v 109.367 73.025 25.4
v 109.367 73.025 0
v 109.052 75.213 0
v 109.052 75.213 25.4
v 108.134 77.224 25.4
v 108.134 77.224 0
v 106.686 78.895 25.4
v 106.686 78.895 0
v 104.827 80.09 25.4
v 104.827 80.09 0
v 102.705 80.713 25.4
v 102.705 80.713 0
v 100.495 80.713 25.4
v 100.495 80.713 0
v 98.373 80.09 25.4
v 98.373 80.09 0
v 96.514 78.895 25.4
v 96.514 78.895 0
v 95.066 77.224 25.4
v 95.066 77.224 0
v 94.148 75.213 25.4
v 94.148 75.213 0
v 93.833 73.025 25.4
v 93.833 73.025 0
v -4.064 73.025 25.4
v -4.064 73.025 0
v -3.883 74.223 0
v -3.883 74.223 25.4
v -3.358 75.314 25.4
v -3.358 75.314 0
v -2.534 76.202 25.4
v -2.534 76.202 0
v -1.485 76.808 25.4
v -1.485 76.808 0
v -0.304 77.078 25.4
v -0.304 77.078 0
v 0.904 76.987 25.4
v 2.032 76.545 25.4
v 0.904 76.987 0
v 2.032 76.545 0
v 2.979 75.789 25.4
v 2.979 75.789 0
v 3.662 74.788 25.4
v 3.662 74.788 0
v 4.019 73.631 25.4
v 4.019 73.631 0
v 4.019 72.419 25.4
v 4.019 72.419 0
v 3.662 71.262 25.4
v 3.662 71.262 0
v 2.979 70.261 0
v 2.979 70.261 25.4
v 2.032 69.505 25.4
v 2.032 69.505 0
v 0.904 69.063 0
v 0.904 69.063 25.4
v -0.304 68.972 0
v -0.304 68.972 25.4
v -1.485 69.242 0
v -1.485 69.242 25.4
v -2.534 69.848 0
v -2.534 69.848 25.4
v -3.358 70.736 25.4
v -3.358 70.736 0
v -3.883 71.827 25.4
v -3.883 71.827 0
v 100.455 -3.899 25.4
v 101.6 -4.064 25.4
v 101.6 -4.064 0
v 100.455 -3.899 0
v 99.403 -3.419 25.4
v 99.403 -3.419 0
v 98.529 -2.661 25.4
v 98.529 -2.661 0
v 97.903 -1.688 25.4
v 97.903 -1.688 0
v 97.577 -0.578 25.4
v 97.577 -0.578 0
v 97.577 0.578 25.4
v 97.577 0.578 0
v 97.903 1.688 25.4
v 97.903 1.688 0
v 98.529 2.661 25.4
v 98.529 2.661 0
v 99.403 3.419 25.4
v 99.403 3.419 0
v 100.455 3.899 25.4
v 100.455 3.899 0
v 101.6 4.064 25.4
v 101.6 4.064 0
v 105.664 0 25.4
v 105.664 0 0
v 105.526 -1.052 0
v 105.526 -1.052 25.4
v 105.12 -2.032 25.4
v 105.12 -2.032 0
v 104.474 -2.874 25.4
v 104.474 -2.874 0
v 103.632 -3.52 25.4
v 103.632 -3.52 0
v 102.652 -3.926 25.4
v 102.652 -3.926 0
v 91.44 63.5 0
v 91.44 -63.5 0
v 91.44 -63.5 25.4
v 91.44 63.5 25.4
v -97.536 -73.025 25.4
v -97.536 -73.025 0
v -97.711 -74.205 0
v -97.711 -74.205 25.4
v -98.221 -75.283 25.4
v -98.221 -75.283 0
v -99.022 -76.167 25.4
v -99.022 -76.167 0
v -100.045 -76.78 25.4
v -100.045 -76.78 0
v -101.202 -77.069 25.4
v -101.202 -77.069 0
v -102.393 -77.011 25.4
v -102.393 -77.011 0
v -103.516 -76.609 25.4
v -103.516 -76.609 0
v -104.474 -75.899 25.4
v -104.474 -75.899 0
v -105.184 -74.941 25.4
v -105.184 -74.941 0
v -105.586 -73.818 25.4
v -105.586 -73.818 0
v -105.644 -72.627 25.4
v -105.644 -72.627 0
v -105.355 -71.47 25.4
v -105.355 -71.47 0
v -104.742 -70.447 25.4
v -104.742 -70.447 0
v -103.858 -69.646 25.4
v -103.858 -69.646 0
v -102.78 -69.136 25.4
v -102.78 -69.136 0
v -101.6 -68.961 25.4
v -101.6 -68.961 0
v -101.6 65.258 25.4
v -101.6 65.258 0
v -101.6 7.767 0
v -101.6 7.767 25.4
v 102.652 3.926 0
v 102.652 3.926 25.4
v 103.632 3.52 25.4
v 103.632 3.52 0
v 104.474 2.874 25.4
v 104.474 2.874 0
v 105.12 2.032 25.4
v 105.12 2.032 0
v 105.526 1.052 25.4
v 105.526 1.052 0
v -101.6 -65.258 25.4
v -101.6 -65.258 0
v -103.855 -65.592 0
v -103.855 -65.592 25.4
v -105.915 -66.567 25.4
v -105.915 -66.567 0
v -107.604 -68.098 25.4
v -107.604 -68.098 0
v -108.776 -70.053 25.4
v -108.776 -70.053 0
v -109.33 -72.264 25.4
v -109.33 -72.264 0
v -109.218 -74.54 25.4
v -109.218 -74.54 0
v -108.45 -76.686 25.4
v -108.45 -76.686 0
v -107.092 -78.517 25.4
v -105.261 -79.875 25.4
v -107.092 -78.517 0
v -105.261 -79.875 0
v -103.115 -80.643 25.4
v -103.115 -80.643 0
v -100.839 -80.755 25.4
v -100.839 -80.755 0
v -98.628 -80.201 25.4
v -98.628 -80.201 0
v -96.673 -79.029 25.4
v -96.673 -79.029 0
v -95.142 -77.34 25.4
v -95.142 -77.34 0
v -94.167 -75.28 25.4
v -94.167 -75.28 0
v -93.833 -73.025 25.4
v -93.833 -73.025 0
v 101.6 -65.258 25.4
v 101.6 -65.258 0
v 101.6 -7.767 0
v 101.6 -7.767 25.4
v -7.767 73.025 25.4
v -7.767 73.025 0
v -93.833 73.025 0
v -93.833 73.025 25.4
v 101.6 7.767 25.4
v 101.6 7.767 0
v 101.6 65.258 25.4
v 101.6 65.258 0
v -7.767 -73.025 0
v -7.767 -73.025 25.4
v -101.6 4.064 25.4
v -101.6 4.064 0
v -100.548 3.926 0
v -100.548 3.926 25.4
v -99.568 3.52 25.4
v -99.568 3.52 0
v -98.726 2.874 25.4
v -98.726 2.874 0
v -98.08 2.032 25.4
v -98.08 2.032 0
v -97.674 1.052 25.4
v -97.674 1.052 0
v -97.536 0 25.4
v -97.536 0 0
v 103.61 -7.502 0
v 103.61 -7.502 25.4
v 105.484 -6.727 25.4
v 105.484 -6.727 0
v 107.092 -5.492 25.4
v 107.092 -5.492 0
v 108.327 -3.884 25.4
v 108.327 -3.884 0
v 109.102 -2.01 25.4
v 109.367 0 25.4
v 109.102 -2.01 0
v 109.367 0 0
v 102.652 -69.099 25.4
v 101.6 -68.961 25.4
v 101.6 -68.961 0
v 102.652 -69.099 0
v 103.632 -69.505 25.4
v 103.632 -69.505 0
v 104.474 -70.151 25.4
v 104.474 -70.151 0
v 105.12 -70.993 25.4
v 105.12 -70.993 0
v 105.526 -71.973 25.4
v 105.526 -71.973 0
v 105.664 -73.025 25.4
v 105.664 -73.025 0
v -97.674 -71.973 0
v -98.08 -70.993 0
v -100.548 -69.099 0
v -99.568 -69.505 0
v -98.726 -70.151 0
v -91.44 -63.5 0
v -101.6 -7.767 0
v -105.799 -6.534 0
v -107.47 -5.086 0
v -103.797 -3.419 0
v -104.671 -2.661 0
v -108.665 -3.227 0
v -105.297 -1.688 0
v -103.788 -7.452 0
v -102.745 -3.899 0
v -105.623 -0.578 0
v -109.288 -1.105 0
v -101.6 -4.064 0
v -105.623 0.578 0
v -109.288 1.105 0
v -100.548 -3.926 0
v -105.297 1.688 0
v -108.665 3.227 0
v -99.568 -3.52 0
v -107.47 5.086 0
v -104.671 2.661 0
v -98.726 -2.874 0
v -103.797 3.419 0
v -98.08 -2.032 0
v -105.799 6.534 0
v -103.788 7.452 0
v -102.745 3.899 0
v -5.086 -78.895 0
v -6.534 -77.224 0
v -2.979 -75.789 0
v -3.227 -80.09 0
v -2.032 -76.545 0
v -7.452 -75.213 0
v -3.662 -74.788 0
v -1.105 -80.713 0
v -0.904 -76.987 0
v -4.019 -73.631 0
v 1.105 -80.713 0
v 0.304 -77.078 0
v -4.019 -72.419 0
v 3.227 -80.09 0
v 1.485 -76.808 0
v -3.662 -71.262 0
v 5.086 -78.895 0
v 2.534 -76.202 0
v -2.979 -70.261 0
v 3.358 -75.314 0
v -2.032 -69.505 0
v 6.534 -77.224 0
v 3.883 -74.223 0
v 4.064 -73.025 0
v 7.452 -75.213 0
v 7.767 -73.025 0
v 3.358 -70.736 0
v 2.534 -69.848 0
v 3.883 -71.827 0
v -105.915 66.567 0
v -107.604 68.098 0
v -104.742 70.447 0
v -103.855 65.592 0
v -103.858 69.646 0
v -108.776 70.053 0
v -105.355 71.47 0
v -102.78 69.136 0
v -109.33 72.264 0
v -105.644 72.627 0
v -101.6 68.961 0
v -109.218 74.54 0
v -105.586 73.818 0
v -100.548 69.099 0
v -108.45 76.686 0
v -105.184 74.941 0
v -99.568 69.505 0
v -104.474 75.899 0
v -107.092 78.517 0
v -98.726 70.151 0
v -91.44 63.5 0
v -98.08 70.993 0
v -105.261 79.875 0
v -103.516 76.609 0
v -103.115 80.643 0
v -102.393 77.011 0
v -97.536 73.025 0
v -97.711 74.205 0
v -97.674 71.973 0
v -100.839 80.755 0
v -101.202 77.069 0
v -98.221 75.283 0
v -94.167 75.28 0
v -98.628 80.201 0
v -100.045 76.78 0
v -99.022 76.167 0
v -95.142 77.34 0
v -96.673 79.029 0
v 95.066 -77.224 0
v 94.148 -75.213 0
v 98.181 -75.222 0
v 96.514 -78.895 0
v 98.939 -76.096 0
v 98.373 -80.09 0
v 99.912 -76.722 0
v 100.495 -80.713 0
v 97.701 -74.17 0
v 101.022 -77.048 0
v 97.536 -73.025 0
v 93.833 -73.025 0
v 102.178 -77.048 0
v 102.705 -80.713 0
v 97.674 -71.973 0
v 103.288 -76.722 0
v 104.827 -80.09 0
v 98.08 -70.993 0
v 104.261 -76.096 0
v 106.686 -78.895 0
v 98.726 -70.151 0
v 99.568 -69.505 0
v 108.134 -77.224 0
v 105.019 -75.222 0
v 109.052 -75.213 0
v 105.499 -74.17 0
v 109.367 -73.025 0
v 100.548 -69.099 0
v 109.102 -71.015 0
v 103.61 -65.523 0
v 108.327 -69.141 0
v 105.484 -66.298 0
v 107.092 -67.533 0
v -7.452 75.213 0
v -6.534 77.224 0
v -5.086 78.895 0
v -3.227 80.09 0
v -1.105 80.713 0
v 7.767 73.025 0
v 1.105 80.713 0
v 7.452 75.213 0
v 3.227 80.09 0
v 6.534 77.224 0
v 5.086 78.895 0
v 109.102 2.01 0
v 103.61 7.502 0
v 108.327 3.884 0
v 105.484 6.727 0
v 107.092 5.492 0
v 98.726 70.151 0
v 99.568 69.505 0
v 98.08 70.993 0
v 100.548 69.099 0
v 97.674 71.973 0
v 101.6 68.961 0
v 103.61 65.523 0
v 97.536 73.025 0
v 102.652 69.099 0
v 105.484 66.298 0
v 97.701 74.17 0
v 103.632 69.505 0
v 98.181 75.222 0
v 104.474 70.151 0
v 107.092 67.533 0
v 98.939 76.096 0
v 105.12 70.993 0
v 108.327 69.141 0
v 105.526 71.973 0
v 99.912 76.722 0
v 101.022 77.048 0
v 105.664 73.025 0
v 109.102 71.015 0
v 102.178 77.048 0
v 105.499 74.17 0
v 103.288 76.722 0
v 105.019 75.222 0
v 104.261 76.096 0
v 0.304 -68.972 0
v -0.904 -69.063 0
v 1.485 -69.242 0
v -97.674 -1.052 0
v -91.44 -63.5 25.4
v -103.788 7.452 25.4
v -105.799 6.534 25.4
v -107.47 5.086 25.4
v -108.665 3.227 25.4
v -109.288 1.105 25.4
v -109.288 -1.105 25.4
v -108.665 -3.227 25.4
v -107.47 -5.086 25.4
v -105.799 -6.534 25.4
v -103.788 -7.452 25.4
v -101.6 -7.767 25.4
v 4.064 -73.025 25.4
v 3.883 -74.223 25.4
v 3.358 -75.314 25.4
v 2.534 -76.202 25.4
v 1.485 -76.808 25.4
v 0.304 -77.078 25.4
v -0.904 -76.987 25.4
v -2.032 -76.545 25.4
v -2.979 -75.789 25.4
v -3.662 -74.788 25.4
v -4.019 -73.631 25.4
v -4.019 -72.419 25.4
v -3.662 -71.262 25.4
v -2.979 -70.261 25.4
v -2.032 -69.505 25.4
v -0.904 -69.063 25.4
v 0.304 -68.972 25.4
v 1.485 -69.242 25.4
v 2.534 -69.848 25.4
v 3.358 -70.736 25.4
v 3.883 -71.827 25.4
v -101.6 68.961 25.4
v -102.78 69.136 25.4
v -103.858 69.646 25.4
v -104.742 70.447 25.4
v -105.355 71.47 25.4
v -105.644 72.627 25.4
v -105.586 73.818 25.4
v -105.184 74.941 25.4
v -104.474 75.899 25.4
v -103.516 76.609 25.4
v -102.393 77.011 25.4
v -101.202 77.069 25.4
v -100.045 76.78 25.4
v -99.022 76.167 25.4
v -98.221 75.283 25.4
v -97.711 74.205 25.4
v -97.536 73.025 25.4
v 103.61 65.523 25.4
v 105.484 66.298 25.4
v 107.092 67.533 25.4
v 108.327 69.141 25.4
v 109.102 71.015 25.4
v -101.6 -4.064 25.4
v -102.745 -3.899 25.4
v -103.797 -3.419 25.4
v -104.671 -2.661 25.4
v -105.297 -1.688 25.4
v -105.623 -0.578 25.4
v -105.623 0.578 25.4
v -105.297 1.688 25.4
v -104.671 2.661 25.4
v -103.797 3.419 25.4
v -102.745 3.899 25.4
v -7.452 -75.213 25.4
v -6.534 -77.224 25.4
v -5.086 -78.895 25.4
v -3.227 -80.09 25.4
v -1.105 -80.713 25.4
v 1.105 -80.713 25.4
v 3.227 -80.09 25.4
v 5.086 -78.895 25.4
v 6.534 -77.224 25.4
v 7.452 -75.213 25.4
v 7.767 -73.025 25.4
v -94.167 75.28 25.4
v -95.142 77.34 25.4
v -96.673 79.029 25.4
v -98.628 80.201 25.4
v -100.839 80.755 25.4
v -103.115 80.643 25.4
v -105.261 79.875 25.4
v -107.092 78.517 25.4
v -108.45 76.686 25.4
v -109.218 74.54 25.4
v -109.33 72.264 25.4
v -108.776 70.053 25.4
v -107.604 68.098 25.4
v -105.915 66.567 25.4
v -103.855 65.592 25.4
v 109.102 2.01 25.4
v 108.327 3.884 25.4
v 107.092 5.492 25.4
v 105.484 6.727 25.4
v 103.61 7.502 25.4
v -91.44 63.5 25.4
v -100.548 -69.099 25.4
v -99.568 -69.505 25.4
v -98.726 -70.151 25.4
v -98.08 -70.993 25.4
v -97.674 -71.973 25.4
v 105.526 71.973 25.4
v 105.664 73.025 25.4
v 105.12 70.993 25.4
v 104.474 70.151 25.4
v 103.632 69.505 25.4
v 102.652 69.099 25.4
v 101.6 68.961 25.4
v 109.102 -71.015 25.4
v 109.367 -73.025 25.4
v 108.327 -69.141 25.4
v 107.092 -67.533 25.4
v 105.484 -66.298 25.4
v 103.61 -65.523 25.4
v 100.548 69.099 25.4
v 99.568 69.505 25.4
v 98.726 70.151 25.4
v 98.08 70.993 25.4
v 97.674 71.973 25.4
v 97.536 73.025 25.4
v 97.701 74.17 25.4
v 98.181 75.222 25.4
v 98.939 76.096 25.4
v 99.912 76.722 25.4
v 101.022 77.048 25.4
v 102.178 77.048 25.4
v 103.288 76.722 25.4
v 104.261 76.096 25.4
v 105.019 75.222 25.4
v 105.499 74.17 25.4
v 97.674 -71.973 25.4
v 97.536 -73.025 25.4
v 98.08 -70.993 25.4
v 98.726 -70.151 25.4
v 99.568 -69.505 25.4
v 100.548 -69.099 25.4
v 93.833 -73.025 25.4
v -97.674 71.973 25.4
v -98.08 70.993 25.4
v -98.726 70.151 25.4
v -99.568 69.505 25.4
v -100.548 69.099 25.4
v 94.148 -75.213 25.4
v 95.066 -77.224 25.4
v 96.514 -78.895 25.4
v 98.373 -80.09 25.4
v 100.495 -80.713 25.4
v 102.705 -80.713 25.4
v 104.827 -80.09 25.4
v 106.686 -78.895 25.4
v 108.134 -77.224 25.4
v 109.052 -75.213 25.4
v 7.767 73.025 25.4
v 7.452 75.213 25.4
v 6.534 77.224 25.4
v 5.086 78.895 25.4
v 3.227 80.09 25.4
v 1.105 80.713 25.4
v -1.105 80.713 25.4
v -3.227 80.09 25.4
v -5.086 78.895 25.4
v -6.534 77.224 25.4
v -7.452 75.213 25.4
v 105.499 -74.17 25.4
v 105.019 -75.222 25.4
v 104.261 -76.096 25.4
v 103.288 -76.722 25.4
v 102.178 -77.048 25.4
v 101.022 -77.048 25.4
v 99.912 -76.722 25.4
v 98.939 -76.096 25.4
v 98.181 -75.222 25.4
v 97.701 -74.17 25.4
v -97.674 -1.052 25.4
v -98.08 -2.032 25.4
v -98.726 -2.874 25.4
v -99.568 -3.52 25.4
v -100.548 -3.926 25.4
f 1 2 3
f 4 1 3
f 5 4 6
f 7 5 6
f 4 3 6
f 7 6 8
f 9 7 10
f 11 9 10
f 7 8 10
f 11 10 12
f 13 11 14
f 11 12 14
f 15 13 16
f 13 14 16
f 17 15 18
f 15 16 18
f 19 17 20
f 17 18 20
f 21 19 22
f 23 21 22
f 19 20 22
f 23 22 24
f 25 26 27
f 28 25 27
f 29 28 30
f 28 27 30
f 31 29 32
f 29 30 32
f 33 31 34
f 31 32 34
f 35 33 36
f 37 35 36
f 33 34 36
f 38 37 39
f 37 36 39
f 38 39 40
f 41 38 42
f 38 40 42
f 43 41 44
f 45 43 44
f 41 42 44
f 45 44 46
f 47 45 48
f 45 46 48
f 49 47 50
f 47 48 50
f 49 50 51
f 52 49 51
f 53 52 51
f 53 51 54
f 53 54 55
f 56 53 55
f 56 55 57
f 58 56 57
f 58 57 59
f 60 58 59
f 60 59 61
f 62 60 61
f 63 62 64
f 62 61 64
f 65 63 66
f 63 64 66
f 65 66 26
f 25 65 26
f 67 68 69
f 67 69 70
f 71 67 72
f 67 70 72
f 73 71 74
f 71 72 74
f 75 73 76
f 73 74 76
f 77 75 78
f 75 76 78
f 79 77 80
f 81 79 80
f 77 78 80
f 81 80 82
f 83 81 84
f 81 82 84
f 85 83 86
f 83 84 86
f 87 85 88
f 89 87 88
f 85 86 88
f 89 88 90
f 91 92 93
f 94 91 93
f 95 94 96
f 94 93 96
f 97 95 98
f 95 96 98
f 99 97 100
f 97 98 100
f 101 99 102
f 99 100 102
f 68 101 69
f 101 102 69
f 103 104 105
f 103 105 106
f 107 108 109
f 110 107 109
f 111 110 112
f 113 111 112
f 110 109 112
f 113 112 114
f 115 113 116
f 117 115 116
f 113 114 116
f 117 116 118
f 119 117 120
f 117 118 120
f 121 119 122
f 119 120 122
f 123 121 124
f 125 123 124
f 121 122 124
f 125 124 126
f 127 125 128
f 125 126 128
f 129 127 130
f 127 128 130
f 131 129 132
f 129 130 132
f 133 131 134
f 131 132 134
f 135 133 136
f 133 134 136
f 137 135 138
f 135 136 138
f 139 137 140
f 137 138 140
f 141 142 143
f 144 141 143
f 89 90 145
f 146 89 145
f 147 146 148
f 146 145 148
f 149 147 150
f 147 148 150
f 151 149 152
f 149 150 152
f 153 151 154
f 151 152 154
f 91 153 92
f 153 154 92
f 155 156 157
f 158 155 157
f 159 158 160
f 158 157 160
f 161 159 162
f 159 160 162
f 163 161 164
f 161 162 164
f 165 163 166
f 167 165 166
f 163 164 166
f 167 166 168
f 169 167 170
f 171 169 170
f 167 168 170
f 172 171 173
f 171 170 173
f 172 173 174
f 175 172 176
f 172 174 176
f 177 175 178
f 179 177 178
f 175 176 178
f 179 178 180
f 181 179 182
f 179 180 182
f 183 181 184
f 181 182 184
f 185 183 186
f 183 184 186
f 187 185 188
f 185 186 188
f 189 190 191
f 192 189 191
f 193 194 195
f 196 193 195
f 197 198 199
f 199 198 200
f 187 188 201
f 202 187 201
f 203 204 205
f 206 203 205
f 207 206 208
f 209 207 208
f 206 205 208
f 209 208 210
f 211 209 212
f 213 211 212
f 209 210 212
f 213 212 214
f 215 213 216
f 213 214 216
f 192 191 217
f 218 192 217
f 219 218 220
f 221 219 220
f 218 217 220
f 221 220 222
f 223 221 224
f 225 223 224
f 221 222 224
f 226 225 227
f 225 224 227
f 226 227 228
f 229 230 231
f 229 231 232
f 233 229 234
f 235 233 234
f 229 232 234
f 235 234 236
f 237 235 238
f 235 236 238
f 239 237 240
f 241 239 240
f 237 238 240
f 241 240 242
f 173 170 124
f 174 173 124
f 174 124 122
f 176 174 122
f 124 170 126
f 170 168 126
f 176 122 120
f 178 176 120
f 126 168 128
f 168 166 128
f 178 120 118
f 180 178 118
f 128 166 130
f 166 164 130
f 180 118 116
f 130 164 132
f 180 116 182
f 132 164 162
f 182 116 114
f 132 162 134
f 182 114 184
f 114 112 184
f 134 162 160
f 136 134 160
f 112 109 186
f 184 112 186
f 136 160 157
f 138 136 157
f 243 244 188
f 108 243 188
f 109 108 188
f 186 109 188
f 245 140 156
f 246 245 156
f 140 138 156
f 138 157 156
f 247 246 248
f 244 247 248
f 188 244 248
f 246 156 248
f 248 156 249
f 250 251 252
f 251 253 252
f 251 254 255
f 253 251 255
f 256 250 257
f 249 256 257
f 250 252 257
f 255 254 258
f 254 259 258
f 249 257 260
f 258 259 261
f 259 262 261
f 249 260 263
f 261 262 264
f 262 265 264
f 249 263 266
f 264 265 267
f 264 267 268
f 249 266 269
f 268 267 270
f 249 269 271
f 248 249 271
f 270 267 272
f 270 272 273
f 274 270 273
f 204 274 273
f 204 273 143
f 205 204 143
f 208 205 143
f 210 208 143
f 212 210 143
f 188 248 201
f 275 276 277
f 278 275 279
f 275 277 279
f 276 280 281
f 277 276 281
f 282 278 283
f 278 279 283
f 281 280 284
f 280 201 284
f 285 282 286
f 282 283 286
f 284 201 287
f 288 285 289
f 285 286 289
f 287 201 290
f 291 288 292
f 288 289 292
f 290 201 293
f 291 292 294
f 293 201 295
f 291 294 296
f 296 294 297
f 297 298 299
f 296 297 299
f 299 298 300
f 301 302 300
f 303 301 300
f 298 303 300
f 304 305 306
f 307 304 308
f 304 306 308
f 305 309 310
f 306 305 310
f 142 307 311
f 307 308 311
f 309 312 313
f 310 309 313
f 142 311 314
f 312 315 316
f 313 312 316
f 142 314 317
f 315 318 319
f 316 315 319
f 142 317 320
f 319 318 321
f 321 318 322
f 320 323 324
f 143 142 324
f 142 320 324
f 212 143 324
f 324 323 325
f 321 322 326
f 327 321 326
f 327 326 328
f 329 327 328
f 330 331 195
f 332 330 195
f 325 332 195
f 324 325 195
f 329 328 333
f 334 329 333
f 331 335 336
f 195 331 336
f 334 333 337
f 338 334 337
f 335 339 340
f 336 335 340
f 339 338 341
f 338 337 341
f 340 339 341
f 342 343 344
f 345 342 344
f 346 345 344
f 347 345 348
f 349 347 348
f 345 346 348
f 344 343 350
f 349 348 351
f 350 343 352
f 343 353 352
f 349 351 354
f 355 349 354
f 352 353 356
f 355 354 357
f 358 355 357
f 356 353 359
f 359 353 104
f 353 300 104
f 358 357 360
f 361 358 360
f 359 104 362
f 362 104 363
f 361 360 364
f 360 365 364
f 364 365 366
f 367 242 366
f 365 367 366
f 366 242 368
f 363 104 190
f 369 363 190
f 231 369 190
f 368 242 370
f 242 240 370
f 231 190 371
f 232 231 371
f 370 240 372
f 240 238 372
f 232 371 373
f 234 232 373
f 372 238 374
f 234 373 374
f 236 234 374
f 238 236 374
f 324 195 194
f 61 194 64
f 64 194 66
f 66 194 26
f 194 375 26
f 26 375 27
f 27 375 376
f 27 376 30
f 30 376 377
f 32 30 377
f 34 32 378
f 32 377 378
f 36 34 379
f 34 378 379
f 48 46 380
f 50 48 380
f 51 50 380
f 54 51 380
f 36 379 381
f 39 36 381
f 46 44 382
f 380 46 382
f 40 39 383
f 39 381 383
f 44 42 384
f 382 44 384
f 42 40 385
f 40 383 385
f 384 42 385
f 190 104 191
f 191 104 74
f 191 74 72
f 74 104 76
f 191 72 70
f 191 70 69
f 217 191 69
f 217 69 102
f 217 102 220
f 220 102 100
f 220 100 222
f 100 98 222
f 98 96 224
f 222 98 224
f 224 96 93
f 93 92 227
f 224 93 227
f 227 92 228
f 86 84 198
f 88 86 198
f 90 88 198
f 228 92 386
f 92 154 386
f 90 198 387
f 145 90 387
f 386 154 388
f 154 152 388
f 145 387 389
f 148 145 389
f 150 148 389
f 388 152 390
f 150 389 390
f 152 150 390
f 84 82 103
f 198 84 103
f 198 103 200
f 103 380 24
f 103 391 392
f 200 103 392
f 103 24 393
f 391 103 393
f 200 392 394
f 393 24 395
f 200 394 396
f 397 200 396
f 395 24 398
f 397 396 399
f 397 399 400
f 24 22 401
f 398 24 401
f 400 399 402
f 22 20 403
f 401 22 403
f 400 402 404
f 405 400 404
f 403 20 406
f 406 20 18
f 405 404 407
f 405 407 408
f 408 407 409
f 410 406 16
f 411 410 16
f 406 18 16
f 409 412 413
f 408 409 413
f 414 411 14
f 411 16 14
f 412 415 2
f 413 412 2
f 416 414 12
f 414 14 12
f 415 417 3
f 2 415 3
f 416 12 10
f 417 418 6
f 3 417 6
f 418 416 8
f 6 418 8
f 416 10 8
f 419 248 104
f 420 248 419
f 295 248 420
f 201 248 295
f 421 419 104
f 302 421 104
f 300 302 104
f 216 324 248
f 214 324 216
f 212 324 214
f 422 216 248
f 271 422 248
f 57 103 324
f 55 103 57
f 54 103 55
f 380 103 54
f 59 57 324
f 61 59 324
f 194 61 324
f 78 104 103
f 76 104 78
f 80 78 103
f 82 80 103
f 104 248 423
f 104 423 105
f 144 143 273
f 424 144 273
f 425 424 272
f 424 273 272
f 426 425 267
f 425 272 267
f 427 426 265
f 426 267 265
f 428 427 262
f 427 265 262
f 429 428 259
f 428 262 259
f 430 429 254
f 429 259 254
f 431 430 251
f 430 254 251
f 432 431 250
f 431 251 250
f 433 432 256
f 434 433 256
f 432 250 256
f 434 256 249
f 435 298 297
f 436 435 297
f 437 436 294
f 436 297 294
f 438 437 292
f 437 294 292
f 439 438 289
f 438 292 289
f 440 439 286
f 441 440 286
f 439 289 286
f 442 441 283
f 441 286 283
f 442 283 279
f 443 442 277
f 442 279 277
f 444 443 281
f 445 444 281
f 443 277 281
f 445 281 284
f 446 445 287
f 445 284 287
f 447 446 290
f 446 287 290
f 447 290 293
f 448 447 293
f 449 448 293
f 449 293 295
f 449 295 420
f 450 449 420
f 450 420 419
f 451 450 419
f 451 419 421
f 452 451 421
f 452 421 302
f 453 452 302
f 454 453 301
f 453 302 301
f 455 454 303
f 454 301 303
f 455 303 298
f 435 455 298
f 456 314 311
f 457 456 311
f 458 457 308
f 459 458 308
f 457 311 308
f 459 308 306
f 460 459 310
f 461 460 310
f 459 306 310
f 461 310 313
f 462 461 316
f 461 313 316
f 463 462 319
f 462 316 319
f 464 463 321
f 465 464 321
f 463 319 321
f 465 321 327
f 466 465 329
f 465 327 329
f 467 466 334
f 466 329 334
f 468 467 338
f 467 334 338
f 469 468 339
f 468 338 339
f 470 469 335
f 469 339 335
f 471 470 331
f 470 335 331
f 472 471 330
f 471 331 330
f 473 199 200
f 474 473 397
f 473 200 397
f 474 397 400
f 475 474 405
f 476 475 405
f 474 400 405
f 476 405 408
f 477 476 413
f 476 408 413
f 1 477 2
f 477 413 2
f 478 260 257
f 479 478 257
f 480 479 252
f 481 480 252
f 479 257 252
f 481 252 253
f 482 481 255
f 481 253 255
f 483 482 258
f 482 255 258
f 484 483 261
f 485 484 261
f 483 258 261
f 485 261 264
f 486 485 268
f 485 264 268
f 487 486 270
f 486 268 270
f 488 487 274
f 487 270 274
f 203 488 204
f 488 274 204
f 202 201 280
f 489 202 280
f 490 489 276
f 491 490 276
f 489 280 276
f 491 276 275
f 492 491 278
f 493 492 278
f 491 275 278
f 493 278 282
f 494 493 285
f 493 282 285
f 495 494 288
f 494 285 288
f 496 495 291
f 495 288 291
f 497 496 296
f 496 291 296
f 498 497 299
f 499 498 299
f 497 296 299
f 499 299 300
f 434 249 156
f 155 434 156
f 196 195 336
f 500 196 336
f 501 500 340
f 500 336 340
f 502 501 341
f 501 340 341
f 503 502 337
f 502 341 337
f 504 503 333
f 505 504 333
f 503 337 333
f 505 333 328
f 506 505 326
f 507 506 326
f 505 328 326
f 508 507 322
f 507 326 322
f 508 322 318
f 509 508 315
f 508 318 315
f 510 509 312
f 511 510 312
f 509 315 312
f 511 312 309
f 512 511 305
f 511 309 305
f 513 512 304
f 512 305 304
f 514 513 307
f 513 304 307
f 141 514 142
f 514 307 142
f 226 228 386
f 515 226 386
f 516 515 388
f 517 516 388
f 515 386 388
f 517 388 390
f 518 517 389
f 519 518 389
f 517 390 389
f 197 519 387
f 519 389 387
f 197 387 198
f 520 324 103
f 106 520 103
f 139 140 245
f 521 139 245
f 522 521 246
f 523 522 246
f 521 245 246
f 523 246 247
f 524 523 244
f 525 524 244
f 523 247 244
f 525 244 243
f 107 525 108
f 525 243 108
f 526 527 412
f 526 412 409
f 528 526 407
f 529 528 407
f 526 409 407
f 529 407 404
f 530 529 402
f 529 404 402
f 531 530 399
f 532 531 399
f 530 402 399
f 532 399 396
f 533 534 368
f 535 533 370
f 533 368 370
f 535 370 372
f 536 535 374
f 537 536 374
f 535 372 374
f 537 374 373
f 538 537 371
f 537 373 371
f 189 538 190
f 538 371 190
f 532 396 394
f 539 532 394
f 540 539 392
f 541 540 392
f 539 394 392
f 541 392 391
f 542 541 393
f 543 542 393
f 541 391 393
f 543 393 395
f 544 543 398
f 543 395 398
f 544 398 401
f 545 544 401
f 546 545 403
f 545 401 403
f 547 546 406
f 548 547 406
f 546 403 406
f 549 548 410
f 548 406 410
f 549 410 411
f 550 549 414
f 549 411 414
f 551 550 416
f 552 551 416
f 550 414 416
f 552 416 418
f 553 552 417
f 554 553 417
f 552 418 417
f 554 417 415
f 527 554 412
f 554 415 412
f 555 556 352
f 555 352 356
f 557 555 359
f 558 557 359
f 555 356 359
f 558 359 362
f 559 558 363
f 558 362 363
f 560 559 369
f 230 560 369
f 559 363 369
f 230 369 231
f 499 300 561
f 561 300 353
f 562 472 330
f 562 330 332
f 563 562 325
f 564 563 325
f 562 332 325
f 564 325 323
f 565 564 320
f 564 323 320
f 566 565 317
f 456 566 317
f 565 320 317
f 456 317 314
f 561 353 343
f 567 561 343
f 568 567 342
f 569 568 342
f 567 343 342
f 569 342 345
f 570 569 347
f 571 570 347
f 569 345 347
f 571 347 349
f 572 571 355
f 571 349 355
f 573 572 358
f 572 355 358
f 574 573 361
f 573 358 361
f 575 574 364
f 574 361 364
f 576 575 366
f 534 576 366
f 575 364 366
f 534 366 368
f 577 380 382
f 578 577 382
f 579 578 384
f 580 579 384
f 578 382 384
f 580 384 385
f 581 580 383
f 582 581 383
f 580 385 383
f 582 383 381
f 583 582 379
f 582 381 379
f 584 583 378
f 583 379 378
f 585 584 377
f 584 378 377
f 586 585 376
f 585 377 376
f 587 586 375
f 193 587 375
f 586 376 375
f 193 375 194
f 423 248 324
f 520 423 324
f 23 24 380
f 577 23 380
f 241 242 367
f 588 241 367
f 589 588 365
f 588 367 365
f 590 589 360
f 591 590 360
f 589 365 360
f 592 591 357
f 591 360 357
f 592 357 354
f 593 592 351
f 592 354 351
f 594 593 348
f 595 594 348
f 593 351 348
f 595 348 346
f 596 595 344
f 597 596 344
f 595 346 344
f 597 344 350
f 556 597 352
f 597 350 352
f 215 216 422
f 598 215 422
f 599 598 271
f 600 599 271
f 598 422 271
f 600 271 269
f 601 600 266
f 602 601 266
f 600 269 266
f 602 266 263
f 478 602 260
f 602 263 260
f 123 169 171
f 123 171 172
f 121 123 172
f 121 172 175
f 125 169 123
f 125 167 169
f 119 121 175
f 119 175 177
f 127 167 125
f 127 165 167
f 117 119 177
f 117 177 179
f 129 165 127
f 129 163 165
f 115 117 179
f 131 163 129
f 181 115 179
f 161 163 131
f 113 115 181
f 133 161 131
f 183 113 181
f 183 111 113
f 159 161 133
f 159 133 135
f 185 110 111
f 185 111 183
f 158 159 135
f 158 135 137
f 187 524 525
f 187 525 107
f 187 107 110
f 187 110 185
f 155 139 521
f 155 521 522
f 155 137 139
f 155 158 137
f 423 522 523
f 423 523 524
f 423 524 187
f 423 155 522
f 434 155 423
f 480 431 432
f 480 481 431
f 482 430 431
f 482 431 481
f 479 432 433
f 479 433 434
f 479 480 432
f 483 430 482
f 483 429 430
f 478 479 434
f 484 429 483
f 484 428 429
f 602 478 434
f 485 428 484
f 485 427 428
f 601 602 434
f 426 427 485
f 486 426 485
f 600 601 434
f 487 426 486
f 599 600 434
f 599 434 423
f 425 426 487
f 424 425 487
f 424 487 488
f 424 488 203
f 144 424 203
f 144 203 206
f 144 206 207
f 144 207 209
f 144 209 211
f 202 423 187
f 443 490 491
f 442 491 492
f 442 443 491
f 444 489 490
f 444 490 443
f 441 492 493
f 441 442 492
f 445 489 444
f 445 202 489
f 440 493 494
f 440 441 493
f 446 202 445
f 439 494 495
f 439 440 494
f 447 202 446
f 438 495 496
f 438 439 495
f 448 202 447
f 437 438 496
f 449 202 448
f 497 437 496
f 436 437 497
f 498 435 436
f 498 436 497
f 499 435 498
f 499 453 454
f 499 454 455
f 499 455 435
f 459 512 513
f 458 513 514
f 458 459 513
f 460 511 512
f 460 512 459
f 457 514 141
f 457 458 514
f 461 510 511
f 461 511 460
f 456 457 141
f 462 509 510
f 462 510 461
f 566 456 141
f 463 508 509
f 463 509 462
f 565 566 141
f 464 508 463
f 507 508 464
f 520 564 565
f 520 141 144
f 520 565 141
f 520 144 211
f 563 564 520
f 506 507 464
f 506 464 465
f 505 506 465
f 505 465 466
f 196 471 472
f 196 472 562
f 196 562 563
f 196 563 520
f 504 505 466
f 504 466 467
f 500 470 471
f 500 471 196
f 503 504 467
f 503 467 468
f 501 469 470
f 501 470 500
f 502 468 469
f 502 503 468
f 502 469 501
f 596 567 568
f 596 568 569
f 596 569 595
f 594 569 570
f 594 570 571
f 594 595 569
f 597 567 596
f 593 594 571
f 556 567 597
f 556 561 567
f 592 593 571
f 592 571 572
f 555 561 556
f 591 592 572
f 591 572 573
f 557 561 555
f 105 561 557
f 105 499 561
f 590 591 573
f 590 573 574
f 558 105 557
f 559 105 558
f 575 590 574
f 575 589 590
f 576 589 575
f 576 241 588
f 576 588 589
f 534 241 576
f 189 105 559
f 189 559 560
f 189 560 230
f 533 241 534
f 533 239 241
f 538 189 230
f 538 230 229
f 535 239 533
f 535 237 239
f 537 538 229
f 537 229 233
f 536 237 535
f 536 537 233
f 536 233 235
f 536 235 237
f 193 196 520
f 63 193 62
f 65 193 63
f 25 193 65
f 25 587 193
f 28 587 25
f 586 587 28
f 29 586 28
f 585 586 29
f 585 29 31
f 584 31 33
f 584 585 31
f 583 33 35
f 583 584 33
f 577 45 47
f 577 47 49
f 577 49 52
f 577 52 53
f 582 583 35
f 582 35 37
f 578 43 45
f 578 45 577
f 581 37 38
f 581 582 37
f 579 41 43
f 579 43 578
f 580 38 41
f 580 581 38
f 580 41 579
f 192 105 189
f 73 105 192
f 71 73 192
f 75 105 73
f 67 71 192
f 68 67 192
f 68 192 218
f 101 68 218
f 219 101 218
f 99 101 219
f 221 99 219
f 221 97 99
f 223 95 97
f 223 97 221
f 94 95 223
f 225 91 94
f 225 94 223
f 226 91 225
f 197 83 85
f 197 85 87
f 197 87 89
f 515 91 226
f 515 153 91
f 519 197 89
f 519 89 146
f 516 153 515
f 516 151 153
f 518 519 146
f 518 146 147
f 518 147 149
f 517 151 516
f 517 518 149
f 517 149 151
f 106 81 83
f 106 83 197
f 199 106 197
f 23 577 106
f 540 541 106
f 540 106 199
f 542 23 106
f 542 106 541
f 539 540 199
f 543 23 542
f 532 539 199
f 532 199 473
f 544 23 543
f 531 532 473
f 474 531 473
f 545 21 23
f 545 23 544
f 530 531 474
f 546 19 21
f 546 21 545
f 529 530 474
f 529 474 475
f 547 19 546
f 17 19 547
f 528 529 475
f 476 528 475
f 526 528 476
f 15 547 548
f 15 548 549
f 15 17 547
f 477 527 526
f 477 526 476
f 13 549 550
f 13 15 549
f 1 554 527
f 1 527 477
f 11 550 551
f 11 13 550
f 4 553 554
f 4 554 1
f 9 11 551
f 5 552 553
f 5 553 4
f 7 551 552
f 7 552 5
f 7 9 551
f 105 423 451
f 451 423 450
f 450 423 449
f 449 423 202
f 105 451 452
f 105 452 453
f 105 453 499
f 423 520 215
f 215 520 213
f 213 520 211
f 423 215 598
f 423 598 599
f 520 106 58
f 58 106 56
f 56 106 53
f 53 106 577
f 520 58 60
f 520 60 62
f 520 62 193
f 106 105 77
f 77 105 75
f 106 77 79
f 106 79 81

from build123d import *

# Parameters (mm, degrees)
F0_W     = 182.88
F0_H     = 127
F1_DEPTH = 25.4


with BuildPart() as f1:
    # F0 (on Top) → F1 (new body)
    with BuildSketch(Plane.XY):
        with BuildLine():
            ThreePointArc((-101.6, 68.961), (-104.4736819587, 75.8986819587), (-97.536, 73.025))
            Line((-97.536, 73.025), (-93.8328908066, 73.025))
            ThreePointArc((-93.8328908066, 73.025), (-107.0921755809, 78.5171755809), (-101.6, 65.2578908066))
            Line((-101.6, 65.2578908066), (-101.6, 68.961))
        make_face()
        with BuildLine():
            Line((-93.8328908066, 73.025), (-97.536, 73.025))
            ThreePointArc((-97.536, 73.025), (-98.7263180413, 70.1513180413), (-101.6, 68.961))
            Line((-101.6, 68.961), (-101.6, 65.2578908066))
            ThreePointArc((-101.6, 65.2578908066), (-96.1078244191, 67.5328244191), (-93.8328908066, 73.025))
        make_face()
        with BuildLine():
            Line((-7.7671091934, 73.025), (-93.8328908066, 73.025))
            ThreePointArc((-93.8328908066, 73.025), (-96.1078244191, 67.5328244191), (-101.6, 65.2578908066))
            Line((-101.6, 65.2578908066), (-101.6, 7.7671091934))
            ThreePointArc((-101.6, 7.7671091934), (-96.1078244191, 5.4921755809), (-93.8328908066, 0))
            ThreePointArc((-93.8328908066, 0), (-96.1078244191, -5.4921755809), (-101.6, -7.7671091934))
            Line((-101.6, -7.7671091934), (-101.6, -65.2578908066))
            ThreePointArc((-101.6, -65.2578908066), (-96.1078244191, -67.5328244191), (-93.8328908066, -73.025))
            Line((-93.8328908066, -73.025), (-7.7671091934, -73.025))
            ThreePointArc((-7.7671091934, -73.025), (0, -65.2578908066), (7.7671091934, -73.025))
            Line((7.7671091934, -73.025), (93.8328908066, -73.025))
            ThreePointArc((93.8328908066, -73.025), (96.1078244191, -67.5328244191), (101.6, -65.2578908066))
            Line((101.6, -65.2578908066), (101.6, -7.7671091934))
            ThreePointArc((101.6, -7.7671091934), (93.8328908066, 0), (101.6, 7.7671091934))
            Line((101.6, 7.7671091934), (101.6, 65.2578908066))
            ThreePointArc((101.6, 65.2578908066), (96.1078244191, 67.5328244191), (93.8328908066, 73.025))
            Line((93.8328908066, 73.025), (7.7671091934, 73.025))
            ThreePointArc((7.7671091934, 73.025), (0, 65.2578908066), (-7.7671091934, 73.025))
        make_face()
        Rectangle(F0_W, F0_H, mode=Mode.SUBTRACT)
        with BuildLine():
            ThreePointArc((7.7671091934, 73.025), (0, 80.7921091934), (-7.7671091934, 73.025))
            Line((-7.7671091934, 73.025), (-4.064, 73.025))
            ThreePointArc((-4.064, 73.025), (0, 77.089), (4.064, 73.025))
            Line((4.064, 73.025), (7.7671091934, 73.025))
        make_face()
        with BuildLine():
            Line((-4.064, 73.025), (-7.7671091934, 73.025))
            ThreePointArc((-7.7671091934, 73.025), (0, 65.2578908066), (7.7671091934, 73.025))
            Line((7.7671091934, 73.025), (4.064, 73.025))
            ThreePointArc((4.064, 73.025), (0, 68.961), (-4.064, 73.025))
        make_face()
        with BuildLine():
            ThreePointArc((-93.8328908066, 0), (-96.1078244191, 5.4921755809), (-101.6, 7.7671091934))
            Line((-101.6, 7.7671091934), (-101.6, 4.064))
            ThreePointArc((-101.6, 4.064), (-98.7263180413, 2.8736819587), (-97.536, 0))
            ThreePointArc((-97.536, 0), (-98.7263180413, -2.8736819587), (-101.6, -4.064))
            Line((-101.6, -4.064), (-101.6, -7.7671091934))
            ThreePointArc((-101.6, -7.7671091934), (-96.1078244191, -5.4921755809), (-93.8328908066, 0))
        make_face()
        with BuildLine():
            Line((-101.6, 4.064), (-101.6, 7.7671091934))
            ThreePointArc((-101.6, 7.7671091934), (-109.3671091934, 0), (-101.6, -7.7671091934))
            Line((-101.6, -7.7671091934), (-101.6, -4.064))
            ThreePointArc((-101.6, -4.064), (-105.664, 0), (-101.6, 4.064))
        make_face()
        with BuildLine():
            ThreePointArc((109.3671091934, 73.025), (101.6, 80.7921091934), (93.8328908066, 73.025))
            Line((93.8328908066, 73.025), (97.536, 73.025))
            ThreePointArc((97.536, 73.025), (101.6, 77.089), (105.664, 73.025))
            ThreePointArc((105.664, 73.025), (104.4736819587, 70.1513180413), (101.6, 68.961))
            Line((101.6, 68.961), (101.6, 65.2578908066))
            ThreePointArc((101.6, 65.2578908066), (107.0921755809, 67.5328244191), (109.3671091934, 73.025))
        make_face()
        with BuildLine():
            Line((97.536, 73.025), (93.8328908066, 73.025))
            ThreePointArc((93.8328908066, 73.025), (96.1078244191, 67.5328244191), (101.6, 65.2578908066))
            Line((101.6, 65.2578908066), (101.6, 68.961))
            ThreePointArc((101.6, 68.961), (98.7263180413, 70.1513180413), (97.536, 73.025))
        make_face()
        with BuildLine():
            ThreePointArc((-93.8328908066, -73.025), (-96.1078244191, -67.5328244191), (-101.6, -65.2578908066))
            Line((-101.6, -65.2578908066), (-101.6, -68.961))
            ThreePointArc((-101.6, -68.961), (-98.7263180413, -70.1513180413), (-97.536, -73.025))
            Line((-97.536, -73.025), (-93.8328908066, -73.025))
        make_face()
        with BuildLine():
            Line((-101.6, -68.961), (-101.6, -65.2578908066))
            ThreePointArc((-101.6, -65.2578908066), (-107.0921755809, -78.5171755809), (-93.8328908066, -73.025))
            Line((-93.8328908066, -73.025), (-97.536, -73.025))
            ThreePointArc((-97.536, -73.025), (-104.4736819587, -75.8986819587), (-101.6, -68.961))
        make_face()
        with BuildLine():
            ThreePointArc((109.3671091934, 0), (107.0921755809, 5.4921755809), (101.6, 7.7671091934))
            Line((101.6, 7.7671091934), (101.6, 4.064))
            ThreePointArc((101.6, 4.064), (104.4736819587, 2.8736819587), (105.664, 0))
            ThreePointArc((105.664, 0), (104.4736819587, -2.8736819587), (101.6, -4.064))
            Line((101.6, -4.064), (101.6, -7.7671091934))
            ThreePointArc((101.6, -7.7671091934), (107.0921755809, -5.4921755809), (109.3671091934, 0))
        make_face()
        with BuildLine():
            Line((101.6, 4.064), (101.6, 7.7671091934))
            ThreePointArc((101.6, 7.7671091934), (93.8328908066, 0), (101.6, -7.7671091934))
            Line((101.6, -7.7671091934), (101.6, -4.064))
            ThreePointArc((101.6, -4.064), (97.536, 0), (101.6, 4.064))
        make_face()
        with BuildLine():
            ThreePointArc((7.7671091934, -73.025), (0, -65.2578908066), (-7.7671091934, -73.025))
            Line((-7.7671091934, -73.025), (-4.064, -73.025))
            ThreePointArc((-4.064, -73.025), (0, -68.961), (4.064, -73.025))
            Line((4.064, -73.025), (7.7671091934, -73.025))
        make_face()
        with BuildLine():
            Line((-4.064, -73.025), (-7.7671091934, -73.025))
            ThreePointArc((-7.7671091934, -73.025), (0, -80.7921091934), (7.7671091934, -73.025))
            Line((7.7671091934, -73.025), (4.064, -73.025))
            ThreePointArc((4.064, -73.025), (0, -77.089), (-4.064, -73.025))
        make_face()
        with BuildLine():
            ThreePointArc((109.3671091934, -73.025), (107.0921755809, -67.5328244191), (101.6, -65.2578908066))
            Line((101.6, -65.2578908066), (101.6, -68.961))
            ThreePointArc((101.6, -68.961), (104.4736819587, -70.1513180413), (105.664, -73.025))
            ThreePointArc((105.664, -73.025), (101.6, -77.089), (97.536, -73.025))
            Line((97.536, -73.025), (93.8328908066, -73.025))
            ThreePointArc((93.8328908066, -73.025), (101.6, -80.7921091934), (109.3671091934, -73.025))
        make_face()
        with BuildLine():
            Line((101.6, -68.961), (101.6, -65.2578908066))
            ThreePointArc((101.6, -65.2578908066), (96.1078244191, -67.5328244191), (93.8328908066, -73.025))
            Line((93.8328908066, -73.025), (97.536, -73.025))
            ThreePointArc((97.536, -73.025), (98.7263180413, -70.1513180413), (101.6, -68.961))
        make_face()
    extrude(amount=F1_DEPTH)


solid = f1.part
